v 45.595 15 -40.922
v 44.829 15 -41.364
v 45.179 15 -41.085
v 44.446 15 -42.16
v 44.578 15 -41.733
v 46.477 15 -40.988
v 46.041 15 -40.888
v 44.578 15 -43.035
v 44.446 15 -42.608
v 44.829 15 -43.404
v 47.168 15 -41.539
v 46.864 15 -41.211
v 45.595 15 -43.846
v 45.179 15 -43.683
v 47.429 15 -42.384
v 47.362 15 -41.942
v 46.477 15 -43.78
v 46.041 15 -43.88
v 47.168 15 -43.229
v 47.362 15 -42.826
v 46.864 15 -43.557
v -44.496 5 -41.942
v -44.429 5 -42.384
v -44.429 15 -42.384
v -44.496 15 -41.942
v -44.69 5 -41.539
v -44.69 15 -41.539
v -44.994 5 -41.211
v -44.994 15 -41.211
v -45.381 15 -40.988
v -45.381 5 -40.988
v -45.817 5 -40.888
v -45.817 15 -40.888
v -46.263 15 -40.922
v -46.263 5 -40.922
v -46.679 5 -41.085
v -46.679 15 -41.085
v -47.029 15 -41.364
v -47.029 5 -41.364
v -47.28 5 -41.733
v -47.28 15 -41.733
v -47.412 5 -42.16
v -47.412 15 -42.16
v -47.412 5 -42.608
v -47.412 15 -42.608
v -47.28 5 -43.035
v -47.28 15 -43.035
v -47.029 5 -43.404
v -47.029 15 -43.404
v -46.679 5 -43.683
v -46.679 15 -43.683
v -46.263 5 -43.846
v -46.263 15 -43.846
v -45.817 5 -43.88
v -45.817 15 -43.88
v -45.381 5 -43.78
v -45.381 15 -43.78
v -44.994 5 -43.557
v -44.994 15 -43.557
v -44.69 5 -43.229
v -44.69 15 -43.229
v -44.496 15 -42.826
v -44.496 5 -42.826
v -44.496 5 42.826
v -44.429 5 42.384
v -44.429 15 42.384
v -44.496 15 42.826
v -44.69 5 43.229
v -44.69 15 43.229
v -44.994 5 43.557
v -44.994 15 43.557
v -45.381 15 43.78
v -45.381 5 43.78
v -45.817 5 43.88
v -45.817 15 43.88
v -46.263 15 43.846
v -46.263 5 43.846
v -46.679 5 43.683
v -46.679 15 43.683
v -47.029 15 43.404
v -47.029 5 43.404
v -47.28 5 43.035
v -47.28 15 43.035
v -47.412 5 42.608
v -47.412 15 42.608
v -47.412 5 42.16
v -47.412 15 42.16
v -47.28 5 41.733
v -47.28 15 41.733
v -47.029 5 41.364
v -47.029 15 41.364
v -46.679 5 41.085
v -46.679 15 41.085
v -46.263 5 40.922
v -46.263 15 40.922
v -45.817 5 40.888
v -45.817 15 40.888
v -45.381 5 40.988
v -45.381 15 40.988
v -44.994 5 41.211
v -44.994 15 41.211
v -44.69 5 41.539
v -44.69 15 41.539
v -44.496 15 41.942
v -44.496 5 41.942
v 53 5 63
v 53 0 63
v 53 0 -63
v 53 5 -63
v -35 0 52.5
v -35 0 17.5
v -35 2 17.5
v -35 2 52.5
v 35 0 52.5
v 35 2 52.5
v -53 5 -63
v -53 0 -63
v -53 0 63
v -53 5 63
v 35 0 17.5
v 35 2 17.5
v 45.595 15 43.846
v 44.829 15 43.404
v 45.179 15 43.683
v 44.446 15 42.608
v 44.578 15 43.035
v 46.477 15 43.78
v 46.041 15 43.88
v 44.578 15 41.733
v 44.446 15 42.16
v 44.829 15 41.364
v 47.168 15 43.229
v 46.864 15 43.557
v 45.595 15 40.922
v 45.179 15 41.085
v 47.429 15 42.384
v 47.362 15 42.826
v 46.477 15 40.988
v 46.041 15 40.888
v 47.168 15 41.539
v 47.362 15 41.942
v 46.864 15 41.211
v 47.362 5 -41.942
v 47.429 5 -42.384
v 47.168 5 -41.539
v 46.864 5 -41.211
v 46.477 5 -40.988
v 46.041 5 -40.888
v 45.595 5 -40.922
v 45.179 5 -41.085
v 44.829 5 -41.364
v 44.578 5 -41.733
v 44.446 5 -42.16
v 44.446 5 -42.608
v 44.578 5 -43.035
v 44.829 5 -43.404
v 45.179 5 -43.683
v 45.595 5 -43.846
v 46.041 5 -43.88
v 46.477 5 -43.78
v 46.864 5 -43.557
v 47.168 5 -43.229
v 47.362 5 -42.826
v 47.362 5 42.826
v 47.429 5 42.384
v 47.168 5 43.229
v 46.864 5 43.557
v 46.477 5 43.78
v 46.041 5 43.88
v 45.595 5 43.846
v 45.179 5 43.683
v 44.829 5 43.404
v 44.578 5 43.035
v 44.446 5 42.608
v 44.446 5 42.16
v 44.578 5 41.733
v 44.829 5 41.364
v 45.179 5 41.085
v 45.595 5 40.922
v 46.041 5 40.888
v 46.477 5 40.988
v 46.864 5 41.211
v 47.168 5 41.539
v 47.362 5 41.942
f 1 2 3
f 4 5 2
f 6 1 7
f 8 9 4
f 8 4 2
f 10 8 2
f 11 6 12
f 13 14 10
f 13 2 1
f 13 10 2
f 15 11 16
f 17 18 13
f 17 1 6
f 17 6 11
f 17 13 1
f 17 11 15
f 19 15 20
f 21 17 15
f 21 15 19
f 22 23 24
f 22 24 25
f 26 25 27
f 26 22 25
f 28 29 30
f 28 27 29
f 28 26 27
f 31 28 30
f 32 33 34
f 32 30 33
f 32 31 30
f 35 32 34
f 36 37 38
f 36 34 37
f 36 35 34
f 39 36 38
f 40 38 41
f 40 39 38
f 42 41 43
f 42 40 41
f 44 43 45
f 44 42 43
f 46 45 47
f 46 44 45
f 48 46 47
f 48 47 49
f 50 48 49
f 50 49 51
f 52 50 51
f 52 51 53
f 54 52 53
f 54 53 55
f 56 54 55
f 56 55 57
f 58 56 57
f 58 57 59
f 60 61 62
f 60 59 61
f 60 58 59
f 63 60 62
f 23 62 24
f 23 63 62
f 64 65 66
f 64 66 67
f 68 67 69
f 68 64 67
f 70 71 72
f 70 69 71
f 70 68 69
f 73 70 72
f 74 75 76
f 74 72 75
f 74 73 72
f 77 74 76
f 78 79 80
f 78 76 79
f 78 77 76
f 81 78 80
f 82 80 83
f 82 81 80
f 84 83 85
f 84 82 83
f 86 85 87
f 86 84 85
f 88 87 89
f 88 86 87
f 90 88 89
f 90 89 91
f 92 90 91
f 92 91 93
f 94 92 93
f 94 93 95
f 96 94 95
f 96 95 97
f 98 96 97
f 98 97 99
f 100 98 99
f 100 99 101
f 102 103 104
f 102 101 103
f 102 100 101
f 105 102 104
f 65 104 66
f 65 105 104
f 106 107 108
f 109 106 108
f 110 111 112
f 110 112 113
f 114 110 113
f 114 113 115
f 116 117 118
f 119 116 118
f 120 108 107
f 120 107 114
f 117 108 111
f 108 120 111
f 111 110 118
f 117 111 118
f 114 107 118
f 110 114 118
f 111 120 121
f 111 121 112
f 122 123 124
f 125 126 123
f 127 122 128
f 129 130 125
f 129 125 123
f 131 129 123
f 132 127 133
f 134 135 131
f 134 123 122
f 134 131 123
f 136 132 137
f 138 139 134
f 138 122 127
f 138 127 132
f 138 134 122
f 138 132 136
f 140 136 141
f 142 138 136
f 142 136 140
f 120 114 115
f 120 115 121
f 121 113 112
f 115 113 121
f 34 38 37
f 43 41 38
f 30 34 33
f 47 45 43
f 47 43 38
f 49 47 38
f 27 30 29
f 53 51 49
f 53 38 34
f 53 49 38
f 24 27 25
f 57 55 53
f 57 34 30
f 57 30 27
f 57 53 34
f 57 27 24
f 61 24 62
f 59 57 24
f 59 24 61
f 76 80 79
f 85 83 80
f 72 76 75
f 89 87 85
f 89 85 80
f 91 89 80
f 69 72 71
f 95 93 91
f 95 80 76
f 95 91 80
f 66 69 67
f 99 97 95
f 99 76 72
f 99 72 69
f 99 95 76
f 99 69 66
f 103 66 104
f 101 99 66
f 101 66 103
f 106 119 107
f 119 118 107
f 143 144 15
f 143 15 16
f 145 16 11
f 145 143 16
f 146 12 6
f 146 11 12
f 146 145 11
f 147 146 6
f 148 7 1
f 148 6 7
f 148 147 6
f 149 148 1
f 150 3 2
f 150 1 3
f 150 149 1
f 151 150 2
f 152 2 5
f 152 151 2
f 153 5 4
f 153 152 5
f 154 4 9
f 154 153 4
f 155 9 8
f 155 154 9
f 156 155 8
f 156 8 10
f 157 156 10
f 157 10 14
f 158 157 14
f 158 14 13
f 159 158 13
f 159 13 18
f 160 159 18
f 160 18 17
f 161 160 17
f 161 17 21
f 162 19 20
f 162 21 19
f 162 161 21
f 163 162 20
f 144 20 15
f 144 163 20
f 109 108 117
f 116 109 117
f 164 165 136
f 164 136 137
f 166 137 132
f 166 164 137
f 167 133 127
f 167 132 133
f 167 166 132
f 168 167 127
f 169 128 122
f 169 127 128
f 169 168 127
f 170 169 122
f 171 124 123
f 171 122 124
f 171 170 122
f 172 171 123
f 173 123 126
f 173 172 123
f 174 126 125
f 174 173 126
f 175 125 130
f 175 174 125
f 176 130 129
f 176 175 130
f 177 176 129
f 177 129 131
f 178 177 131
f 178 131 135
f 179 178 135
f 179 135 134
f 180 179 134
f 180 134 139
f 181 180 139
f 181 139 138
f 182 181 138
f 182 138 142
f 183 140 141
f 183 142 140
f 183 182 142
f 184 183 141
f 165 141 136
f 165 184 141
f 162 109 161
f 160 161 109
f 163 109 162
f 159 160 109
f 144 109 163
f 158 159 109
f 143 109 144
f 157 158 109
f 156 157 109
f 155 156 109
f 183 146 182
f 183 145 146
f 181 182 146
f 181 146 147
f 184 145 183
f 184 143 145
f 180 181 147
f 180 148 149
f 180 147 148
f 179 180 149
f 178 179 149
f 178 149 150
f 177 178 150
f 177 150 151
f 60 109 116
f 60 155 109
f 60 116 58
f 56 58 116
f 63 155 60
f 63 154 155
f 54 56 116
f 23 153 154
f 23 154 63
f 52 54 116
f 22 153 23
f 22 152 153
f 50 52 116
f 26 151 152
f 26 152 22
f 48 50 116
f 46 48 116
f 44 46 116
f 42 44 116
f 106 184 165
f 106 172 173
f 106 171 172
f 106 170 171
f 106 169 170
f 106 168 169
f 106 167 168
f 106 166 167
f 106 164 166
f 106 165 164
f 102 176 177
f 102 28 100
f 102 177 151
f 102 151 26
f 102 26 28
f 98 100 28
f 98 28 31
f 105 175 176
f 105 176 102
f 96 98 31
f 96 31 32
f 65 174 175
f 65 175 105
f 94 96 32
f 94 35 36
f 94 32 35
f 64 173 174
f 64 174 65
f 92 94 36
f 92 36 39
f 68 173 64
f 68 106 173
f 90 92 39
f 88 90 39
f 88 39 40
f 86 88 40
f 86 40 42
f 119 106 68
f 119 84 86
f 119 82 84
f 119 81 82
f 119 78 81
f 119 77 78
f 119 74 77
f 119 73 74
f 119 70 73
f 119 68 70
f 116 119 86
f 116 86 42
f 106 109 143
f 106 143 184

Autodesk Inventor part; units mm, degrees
ref_plane "YZ Plane" through (0, 0, 0) normal (1, 0, 0) x (0, 1, 0)
ref_plane "XZ Plane" through (0, 0, 0) normal (0, 1, 0) x (-1, 0, 0)
ref_plane "XY Plane" through (0, 0, 0) normal (0, 0, 1) x (1, 0, 0)
sketch "Boceto1" plane through (0, 0, 0) normal (0, 1, 0) x (-1, 0, 0)
  line L0 (53, 63) -> (-53, 63)
  line L1 (-53, 63) -> (-53, -63)
  line L2 (-53, -63) -> (53, -63)
  line L3 (53, -63) -> (53, 63)
  point P0 (0, 0)
  point P1 (0, 63)
  dimension "d1" = 106
  dimension "d2" = 126
  dimension "d3" = 53
  dimension "d4" = 63
extrude "Extrusión1" add sketch "Boceto1" along normal blind 5
sketch "Boceto2" plane through (0, 5, 0) normal (0, 1, 0) x (1, 0, 0)
  circle A0 centre (-45.929, -42.384) radius 1.5
  line L0 (-53, -63) -> (53, -63) projected
  line L1 (-53, 63) -> (-53, -63) projected
  line L2 (-81, 0) -> (77, 0)
  line L3 (0, -130) -> (0, 128)
  circle A1 centre (-45.929, 42.384) radius 1.5
  line L4 (-53, -63) -> (-53, 63)
  circle A2 centre (45.929, -42.384) radius 1.5
  circle A3 centre (45.929, 42.384) radius 1.5
  point P0 (0, 0)
  dimension "d7" = 3
  dimension "d8" = 20.616
  dimension "d9" = 7.071
extrude "Extrusión2" add sketch "Boceto2" along normal blind 10 contours A0 | A1 | A2 | A3
sketch "Boceto3" plane through (0, 0, 0) normal (0, -1, 0) x (1, 0, 0)
  line L0 (-35, 52.5) -> (35, 52.5)
  line L1 (35, 52.5) -> (35, -52.5)
  line L2 (35, -52.5) -> (-35, -52.5)
  line L3 (-35, -52.5) -> (-35, 52.5)
  line L4 (53, -63) -> (-53, -63) projected
  line L5 (-53, 63) -> (53, 63) projected
  line L6 (53, 63) -> (53, -63) projected
  line L7 (-53, -63) -> (-53, 63) projected
  line L8 (35, 17.5) -> (-35, 17.5)
  line L9 (35, -17.5) -> (-35, -17.5)
  line L10 (0, 52.5) -> (0, -52.5)
  point P0 (0, 0)
  point P1 (0, 17.5)
  dimension "d12" = 52.5
  dimension "d13" = 126
  dimension "d14" = 106
  dimension "d15" = 52.5
  dimension "d16" = 35
  dimension "d17" = 35
  dimension "d18" = 35
  dimension "d19" = 35
  dimension "d20" = 35
extrude "Extrusión3" cut sketch "Boceto3" against normal blind 2 contours L0 L10 L8 L3 | L0 L1 L8 L10
properties part number "Tapa 0"
